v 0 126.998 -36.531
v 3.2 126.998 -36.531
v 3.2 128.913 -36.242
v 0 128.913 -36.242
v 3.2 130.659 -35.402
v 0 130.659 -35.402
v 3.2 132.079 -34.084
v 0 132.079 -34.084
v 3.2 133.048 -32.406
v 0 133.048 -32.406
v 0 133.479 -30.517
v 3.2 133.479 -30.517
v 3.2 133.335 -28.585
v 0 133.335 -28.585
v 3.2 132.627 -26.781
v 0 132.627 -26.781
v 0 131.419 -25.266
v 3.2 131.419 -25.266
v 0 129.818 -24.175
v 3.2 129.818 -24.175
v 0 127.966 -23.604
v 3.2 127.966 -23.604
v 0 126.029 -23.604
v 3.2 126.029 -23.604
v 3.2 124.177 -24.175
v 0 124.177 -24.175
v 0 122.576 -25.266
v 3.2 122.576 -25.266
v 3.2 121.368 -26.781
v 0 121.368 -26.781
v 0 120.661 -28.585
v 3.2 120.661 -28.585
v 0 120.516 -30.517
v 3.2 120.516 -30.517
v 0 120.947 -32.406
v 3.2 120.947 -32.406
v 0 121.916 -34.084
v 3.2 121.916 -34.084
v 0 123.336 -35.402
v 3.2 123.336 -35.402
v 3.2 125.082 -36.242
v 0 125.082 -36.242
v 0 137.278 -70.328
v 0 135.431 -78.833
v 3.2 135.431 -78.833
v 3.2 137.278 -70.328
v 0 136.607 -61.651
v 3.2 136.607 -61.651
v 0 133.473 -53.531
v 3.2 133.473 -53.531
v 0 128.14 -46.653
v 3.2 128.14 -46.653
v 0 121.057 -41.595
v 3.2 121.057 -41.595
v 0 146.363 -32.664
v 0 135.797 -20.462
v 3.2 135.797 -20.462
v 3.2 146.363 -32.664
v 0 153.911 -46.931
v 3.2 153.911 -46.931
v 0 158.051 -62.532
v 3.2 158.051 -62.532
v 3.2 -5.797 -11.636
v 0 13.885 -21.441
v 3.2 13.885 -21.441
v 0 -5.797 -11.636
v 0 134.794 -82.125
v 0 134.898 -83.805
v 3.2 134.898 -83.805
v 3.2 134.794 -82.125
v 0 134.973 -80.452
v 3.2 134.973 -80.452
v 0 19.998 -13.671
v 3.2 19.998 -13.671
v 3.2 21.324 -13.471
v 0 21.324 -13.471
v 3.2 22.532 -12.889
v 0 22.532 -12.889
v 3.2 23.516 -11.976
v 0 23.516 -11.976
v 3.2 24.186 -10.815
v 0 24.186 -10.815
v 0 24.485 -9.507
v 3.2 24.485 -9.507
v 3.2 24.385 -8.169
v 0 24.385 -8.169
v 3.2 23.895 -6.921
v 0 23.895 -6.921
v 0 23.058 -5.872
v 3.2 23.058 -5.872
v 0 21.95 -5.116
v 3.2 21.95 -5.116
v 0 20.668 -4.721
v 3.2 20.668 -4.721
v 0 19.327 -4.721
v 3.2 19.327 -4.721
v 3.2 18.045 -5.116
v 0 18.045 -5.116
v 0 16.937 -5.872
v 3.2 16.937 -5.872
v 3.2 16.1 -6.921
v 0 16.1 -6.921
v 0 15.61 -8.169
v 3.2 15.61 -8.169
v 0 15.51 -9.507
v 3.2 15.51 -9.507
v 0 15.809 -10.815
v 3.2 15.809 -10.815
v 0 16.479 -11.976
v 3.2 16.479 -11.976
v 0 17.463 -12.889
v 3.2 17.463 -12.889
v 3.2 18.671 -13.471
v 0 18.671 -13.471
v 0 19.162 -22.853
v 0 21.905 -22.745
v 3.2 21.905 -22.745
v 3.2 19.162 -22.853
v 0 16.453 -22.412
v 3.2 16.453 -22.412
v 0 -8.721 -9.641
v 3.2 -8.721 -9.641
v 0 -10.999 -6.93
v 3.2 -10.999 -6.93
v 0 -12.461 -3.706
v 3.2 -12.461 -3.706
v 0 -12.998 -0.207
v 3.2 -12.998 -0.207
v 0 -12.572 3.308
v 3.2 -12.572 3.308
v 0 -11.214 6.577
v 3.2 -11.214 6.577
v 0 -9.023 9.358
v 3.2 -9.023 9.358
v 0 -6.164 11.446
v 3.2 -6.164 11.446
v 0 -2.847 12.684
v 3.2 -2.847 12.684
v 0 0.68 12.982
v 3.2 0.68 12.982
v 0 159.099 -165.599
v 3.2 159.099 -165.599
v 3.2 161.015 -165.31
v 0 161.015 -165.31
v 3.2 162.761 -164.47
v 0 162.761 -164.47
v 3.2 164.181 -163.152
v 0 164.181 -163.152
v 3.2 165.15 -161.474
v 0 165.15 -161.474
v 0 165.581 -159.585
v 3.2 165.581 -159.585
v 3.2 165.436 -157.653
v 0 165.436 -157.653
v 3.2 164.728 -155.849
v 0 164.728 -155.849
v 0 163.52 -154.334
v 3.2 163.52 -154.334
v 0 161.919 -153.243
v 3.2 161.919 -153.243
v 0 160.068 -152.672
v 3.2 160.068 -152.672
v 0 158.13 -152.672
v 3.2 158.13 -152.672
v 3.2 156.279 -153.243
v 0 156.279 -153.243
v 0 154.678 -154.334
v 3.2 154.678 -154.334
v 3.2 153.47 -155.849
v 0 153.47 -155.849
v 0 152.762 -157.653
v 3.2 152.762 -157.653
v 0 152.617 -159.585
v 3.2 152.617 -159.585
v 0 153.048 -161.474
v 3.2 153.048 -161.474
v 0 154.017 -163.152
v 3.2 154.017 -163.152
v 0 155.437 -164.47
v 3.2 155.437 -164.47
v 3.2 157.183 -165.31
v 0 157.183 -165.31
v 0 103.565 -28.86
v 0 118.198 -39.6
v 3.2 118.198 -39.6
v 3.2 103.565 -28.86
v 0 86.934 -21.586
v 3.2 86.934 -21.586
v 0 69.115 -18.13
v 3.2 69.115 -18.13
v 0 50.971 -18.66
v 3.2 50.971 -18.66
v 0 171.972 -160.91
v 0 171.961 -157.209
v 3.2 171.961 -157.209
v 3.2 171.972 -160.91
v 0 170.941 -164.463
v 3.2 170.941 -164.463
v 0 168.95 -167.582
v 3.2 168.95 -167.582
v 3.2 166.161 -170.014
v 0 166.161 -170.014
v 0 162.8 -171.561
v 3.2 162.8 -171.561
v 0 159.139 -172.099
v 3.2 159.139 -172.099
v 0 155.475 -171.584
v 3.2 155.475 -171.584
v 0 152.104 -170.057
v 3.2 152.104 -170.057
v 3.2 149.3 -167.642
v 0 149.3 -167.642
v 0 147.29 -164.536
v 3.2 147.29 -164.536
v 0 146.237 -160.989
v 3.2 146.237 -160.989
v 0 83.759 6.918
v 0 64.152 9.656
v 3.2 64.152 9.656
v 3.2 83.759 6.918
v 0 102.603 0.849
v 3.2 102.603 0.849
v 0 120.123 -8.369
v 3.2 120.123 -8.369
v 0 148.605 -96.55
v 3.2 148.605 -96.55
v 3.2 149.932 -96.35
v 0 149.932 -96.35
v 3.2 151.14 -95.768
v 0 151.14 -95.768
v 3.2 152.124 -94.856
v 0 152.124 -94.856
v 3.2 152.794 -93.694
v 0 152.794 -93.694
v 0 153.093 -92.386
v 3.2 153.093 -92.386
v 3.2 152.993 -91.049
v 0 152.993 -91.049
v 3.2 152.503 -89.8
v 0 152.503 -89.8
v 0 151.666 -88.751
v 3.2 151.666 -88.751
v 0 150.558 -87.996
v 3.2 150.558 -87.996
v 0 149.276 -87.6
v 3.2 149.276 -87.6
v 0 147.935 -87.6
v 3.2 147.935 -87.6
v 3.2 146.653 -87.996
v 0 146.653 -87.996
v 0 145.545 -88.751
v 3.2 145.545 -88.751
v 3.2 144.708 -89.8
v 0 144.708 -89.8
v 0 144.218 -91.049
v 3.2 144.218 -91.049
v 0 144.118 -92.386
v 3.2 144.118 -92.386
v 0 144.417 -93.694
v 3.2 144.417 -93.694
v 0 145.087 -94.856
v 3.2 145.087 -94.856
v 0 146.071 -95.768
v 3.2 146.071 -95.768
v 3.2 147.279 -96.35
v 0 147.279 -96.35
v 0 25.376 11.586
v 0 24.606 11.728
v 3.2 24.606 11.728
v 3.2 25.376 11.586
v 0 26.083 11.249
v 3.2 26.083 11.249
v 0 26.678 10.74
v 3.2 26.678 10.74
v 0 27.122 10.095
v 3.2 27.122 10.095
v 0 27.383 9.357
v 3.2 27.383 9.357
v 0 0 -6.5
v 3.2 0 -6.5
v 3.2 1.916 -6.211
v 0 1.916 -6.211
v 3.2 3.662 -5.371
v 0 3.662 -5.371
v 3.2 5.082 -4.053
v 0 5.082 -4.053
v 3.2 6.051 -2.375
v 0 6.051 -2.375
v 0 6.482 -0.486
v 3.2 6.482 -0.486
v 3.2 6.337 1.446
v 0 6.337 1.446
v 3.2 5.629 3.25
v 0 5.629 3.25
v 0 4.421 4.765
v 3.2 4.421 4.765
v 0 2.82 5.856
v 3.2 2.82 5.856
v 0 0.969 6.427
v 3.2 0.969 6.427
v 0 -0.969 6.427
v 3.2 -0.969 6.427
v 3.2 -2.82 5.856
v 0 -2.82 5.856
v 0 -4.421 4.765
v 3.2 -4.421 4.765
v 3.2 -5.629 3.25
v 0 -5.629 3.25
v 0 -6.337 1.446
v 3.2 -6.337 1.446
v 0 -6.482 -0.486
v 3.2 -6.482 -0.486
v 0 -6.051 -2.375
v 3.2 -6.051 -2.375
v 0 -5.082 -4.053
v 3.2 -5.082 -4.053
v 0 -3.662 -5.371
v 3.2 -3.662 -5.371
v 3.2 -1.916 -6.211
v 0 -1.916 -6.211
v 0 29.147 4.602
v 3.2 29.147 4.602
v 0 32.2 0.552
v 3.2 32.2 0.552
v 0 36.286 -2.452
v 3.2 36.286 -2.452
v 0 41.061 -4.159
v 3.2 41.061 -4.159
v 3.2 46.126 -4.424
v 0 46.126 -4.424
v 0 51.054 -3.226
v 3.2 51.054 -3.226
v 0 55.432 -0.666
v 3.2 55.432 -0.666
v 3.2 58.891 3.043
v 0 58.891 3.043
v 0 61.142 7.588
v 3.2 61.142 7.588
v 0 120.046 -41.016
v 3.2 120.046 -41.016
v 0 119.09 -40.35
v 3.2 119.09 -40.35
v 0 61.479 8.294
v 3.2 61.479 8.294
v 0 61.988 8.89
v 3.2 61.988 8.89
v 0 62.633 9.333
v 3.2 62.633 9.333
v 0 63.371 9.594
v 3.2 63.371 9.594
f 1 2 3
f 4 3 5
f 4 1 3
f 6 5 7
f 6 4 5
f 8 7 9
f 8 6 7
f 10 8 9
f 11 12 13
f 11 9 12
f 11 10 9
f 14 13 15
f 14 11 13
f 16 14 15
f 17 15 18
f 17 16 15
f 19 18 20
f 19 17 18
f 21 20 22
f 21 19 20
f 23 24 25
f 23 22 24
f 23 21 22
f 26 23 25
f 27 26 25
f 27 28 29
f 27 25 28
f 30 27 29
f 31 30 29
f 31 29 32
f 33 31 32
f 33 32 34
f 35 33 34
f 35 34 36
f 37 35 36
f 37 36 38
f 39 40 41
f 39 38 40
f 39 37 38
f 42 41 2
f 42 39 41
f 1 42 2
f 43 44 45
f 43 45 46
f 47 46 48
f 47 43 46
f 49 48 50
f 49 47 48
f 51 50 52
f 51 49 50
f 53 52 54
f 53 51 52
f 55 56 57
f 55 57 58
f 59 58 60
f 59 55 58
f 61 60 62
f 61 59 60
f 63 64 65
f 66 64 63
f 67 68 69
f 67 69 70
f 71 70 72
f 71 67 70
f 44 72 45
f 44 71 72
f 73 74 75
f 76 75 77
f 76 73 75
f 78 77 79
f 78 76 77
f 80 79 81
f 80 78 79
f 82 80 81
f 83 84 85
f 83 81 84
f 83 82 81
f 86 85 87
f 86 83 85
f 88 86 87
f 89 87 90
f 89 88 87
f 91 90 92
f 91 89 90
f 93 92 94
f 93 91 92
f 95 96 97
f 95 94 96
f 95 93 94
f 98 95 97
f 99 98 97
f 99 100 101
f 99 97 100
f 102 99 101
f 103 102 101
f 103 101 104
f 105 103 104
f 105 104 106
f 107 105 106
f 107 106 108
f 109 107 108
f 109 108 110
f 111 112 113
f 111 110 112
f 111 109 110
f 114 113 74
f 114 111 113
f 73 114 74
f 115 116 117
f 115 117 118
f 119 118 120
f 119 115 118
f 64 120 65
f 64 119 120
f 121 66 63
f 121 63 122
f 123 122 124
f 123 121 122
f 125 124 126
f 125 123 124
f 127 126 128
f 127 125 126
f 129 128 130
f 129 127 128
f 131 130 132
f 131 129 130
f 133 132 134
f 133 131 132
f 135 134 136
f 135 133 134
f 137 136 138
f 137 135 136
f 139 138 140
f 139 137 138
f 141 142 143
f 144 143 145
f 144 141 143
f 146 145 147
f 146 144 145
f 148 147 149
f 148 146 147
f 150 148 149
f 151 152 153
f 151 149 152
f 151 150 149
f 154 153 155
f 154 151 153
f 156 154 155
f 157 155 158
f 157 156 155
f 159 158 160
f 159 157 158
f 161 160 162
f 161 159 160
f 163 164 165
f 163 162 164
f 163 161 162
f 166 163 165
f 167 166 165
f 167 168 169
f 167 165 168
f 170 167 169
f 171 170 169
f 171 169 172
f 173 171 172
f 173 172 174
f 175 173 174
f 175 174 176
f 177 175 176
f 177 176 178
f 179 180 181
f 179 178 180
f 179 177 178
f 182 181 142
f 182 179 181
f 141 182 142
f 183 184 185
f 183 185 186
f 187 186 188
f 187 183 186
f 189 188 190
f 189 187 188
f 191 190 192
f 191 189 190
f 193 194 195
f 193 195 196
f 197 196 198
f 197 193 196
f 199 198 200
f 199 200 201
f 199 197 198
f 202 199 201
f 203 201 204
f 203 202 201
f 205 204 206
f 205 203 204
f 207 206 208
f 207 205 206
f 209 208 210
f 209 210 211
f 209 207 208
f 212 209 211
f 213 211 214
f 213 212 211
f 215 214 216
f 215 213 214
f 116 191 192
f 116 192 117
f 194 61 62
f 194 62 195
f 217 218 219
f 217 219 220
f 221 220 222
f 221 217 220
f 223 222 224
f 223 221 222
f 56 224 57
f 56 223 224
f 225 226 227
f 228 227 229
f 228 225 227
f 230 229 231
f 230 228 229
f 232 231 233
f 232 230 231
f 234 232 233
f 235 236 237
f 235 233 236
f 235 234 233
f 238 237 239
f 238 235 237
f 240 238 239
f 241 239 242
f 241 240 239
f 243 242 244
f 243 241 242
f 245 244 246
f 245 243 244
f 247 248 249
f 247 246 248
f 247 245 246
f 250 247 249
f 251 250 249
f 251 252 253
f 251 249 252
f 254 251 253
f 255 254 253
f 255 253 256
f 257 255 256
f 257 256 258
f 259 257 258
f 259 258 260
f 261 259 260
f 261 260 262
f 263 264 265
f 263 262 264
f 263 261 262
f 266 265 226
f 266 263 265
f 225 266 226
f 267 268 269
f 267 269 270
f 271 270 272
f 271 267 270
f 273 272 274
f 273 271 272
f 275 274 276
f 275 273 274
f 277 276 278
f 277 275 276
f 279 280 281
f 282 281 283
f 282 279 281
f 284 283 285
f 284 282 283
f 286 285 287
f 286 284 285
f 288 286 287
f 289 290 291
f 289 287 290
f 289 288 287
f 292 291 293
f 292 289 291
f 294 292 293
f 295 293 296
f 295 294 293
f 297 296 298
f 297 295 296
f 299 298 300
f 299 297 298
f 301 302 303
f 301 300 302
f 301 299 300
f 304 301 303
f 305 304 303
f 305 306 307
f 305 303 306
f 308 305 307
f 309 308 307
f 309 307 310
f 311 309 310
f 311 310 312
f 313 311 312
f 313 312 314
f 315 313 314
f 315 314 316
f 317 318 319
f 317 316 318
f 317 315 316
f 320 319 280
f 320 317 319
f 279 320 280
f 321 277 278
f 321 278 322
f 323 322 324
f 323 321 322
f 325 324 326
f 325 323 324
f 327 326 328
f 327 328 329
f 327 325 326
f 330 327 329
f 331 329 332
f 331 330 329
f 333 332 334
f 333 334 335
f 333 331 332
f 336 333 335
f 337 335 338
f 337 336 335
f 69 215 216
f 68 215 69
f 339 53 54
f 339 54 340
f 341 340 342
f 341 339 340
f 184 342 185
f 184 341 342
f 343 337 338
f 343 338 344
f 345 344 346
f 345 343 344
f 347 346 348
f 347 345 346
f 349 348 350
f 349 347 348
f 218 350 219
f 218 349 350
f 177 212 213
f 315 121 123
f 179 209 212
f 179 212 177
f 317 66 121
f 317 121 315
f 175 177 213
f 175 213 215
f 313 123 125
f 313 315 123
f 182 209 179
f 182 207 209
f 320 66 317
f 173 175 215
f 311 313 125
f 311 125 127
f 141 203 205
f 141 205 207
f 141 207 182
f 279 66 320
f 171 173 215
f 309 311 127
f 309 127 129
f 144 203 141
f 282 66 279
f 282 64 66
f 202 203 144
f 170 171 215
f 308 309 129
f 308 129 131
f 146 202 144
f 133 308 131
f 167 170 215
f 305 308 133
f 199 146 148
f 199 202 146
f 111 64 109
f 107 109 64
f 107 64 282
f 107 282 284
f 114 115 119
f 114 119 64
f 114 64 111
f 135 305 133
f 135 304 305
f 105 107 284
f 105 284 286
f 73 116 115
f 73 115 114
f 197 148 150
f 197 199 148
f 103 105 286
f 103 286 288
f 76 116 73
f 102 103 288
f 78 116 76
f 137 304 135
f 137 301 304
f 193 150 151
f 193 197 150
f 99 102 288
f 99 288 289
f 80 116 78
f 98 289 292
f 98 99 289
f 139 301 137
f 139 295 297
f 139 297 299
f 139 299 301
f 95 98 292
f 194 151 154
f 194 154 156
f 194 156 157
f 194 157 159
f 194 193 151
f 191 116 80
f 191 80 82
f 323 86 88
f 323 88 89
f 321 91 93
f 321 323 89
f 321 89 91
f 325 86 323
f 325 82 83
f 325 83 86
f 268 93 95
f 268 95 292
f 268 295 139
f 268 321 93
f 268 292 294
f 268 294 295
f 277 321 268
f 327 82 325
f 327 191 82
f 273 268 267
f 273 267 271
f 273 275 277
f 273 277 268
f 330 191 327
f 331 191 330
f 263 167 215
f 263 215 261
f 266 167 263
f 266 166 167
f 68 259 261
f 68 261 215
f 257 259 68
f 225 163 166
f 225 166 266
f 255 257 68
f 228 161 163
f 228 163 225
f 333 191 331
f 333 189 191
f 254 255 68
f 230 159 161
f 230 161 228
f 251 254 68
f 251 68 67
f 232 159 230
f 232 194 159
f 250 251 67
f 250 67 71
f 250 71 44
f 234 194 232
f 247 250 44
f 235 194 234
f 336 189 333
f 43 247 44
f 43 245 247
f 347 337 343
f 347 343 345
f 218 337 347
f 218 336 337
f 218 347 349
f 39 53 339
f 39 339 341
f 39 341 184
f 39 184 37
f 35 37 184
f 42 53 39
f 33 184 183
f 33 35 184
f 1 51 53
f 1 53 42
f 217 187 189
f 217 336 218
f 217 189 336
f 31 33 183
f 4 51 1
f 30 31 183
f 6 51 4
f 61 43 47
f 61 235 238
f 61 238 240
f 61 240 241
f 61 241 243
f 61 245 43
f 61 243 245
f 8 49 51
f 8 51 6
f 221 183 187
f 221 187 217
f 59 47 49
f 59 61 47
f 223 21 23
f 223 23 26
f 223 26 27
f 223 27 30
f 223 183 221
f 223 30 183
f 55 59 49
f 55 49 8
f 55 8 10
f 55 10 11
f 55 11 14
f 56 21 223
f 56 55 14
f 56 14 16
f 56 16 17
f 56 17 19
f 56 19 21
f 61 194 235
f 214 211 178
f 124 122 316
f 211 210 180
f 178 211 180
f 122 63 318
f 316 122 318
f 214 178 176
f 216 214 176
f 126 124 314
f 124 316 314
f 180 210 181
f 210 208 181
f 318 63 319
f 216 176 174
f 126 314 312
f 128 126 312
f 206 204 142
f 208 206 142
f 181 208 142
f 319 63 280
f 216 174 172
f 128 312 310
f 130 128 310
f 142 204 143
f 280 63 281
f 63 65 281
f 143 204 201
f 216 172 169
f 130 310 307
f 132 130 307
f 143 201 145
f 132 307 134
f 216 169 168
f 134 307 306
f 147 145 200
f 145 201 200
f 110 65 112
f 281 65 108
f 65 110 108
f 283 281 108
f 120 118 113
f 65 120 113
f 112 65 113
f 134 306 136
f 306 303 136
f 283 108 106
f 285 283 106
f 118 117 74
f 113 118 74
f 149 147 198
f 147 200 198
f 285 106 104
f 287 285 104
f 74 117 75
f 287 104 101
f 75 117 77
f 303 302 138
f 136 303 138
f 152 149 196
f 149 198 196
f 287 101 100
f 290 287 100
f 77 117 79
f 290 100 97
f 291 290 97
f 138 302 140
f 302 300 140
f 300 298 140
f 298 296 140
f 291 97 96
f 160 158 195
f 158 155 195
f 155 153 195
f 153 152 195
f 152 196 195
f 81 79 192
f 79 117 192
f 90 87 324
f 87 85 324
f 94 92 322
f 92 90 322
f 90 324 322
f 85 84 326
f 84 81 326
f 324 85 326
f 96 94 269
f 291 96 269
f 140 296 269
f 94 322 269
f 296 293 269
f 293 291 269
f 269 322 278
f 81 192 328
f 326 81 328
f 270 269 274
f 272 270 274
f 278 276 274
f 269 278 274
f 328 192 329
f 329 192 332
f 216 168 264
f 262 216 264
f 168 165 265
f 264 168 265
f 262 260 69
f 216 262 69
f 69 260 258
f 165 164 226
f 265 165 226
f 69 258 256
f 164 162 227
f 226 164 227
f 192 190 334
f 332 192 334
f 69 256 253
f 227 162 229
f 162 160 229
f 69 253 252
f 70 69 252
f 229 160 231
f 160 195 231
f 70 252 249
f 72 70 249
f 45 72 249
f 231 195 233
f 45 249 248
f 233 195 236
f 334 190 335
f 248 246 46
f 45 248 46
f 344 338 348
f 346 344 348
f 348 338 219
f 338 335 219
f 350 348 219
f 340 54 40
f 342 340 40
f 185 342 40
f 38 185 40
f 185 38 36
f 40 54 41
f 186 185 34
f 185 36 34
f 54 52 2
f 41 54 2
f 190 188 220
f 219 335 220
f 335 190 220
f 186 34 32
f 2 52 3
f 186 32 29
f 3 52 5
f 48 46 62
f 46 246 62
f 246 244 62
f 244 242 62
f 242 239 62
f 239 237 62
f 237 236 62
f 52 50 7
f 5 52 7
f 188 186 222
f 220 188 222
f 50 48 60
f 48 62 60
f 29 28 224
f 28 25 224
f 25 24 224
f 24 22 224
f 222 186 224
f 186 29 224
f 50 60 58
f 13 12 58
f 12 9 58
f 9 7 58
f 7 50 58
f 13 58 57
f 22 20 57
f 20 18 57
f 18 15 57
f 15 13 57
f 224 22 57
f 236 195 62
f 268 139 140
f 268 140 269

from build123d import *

# Parameters (mm, degrees)
EXTRUDE1_DEPTH            = 3.2
SKETCH5_R                 = 6.5
CHASSIS_MOUNT_HOLES_DEPTH = 244.405812041
SKETCH6_R                 = 4.5
ENGINE_MOUNT_HOLES_DEPTH  = 244.405812041


with BuildPart() as part:
    # Sketch4 → Extrude1 (new body)
    with BuildSketch(Plane(origin=(0, 0, 0), x_dir=(0, 0, -1), z_dir=(1, 0, 0))):
        with BuildLine():
            Line((62.532051611, 158.051475499), (157.209419868, 171.960961445))
            ThreePointArc((157.209419868, 171.960961445), (171.960961445, 160.988631666), (160.988631666, 146.237090089))
            Line((160.988631666, 146.237090089), (83.804641545, 134.897636473))
            ThreePointArc((83.804641545, 134.897636473), (81.285036333, 134.84841996), (78.833134949, 135.430667579))
            ThreePointArc((78.833134949, 135.430667579), (57.476451891, 135.335862335), (41.594586736, 121.057092835))
            ThreePointArc((41.594586736, 121.057092835), (40.693699631, 119.560345202), (39.600266647, 118.197900576))
            ThreePointArc((39.600266647, 118.197900576), (21.5857968, 86.934366989), (18.660417288, 50.97088814))
            Line((18.660417288, 50.97088814), (22.745312053, 21.905351613))
            ThreePointArc((22.745312053, 21.905351613), (22.700845783, 17.796400072), (21.440584589, 13.88523634))
            Line((21.440584589, 13.88523634), (11.636162946, -5.796526027))
            ThreePointArc((11.636162946, -5.796526027), (-3.307639706, -12.572172512), (-12.982184032, 0.680367435))
            Line((-12.982184032, 0.680367435), (-11.728287792, 24.606132992))
            ThreePointArc((-11.728287792, 24.606132992), (-11.013879957, 26.397161442), (-9.356926136, 27.383399496))
            ThreePointArc((-9.356926136, 27.383399496), (4.476016858, 43.584120766), (-7.587711328, 61.142029063))
            ThreePointArc((-7.587711328, 61.142029063), (-9.132498235, 62.296063238), (-9.655779017, 64.1519562))
            ThreePointArc((-9.655779017, 64.1519562), (-0.849075896, 102.602883239), (20.462203873, 135.797177398))
            ThreePointArc((20.462203873, 135.797177398), (39.583099322, 150.54263352), (62.532051611, 158.051475499))
        make_face()
    extrude(amount=EXTRUDE1_DEPTH)

    # Sketch5 → chassis mount holes (cut, through all)
    with BuildSketch(Plane(origin=(0, 0, 0), x_dir=(0, 0, -1), z_dir=(1, 0, 0))):
        Circle(SKETCH5_R)
        with Locations((159.099025767, 159.099025767)):
            Circle(SKETCH5_R)
        with Locations((30.03123526, 126.997538987)):
            Circle(SKETCH5_R)
    extrude(amount=CHASSIS_MOUNT_HOLES_DEPTH, mode=Mode.SUBTRACT)

    # Sketch6 → engine mount holes (cut, through all)
    with BuildSketch(Plane(origin=(0, 0, 0), x_dir=(0, 0, -1), z_dir=(1, 0, 0))):
        with Locations((9.170519858, 19.997538987)):
            Circle(SKETCH6_R)
        with Locations((92.049906905, 148.605498316)):
            Circle(SKETCH6_R)
    extrude(amount=ENGINE_MOUNT_HOLES_DEPTH, mode=Mode.SUBTRACT)


solid = part.part
